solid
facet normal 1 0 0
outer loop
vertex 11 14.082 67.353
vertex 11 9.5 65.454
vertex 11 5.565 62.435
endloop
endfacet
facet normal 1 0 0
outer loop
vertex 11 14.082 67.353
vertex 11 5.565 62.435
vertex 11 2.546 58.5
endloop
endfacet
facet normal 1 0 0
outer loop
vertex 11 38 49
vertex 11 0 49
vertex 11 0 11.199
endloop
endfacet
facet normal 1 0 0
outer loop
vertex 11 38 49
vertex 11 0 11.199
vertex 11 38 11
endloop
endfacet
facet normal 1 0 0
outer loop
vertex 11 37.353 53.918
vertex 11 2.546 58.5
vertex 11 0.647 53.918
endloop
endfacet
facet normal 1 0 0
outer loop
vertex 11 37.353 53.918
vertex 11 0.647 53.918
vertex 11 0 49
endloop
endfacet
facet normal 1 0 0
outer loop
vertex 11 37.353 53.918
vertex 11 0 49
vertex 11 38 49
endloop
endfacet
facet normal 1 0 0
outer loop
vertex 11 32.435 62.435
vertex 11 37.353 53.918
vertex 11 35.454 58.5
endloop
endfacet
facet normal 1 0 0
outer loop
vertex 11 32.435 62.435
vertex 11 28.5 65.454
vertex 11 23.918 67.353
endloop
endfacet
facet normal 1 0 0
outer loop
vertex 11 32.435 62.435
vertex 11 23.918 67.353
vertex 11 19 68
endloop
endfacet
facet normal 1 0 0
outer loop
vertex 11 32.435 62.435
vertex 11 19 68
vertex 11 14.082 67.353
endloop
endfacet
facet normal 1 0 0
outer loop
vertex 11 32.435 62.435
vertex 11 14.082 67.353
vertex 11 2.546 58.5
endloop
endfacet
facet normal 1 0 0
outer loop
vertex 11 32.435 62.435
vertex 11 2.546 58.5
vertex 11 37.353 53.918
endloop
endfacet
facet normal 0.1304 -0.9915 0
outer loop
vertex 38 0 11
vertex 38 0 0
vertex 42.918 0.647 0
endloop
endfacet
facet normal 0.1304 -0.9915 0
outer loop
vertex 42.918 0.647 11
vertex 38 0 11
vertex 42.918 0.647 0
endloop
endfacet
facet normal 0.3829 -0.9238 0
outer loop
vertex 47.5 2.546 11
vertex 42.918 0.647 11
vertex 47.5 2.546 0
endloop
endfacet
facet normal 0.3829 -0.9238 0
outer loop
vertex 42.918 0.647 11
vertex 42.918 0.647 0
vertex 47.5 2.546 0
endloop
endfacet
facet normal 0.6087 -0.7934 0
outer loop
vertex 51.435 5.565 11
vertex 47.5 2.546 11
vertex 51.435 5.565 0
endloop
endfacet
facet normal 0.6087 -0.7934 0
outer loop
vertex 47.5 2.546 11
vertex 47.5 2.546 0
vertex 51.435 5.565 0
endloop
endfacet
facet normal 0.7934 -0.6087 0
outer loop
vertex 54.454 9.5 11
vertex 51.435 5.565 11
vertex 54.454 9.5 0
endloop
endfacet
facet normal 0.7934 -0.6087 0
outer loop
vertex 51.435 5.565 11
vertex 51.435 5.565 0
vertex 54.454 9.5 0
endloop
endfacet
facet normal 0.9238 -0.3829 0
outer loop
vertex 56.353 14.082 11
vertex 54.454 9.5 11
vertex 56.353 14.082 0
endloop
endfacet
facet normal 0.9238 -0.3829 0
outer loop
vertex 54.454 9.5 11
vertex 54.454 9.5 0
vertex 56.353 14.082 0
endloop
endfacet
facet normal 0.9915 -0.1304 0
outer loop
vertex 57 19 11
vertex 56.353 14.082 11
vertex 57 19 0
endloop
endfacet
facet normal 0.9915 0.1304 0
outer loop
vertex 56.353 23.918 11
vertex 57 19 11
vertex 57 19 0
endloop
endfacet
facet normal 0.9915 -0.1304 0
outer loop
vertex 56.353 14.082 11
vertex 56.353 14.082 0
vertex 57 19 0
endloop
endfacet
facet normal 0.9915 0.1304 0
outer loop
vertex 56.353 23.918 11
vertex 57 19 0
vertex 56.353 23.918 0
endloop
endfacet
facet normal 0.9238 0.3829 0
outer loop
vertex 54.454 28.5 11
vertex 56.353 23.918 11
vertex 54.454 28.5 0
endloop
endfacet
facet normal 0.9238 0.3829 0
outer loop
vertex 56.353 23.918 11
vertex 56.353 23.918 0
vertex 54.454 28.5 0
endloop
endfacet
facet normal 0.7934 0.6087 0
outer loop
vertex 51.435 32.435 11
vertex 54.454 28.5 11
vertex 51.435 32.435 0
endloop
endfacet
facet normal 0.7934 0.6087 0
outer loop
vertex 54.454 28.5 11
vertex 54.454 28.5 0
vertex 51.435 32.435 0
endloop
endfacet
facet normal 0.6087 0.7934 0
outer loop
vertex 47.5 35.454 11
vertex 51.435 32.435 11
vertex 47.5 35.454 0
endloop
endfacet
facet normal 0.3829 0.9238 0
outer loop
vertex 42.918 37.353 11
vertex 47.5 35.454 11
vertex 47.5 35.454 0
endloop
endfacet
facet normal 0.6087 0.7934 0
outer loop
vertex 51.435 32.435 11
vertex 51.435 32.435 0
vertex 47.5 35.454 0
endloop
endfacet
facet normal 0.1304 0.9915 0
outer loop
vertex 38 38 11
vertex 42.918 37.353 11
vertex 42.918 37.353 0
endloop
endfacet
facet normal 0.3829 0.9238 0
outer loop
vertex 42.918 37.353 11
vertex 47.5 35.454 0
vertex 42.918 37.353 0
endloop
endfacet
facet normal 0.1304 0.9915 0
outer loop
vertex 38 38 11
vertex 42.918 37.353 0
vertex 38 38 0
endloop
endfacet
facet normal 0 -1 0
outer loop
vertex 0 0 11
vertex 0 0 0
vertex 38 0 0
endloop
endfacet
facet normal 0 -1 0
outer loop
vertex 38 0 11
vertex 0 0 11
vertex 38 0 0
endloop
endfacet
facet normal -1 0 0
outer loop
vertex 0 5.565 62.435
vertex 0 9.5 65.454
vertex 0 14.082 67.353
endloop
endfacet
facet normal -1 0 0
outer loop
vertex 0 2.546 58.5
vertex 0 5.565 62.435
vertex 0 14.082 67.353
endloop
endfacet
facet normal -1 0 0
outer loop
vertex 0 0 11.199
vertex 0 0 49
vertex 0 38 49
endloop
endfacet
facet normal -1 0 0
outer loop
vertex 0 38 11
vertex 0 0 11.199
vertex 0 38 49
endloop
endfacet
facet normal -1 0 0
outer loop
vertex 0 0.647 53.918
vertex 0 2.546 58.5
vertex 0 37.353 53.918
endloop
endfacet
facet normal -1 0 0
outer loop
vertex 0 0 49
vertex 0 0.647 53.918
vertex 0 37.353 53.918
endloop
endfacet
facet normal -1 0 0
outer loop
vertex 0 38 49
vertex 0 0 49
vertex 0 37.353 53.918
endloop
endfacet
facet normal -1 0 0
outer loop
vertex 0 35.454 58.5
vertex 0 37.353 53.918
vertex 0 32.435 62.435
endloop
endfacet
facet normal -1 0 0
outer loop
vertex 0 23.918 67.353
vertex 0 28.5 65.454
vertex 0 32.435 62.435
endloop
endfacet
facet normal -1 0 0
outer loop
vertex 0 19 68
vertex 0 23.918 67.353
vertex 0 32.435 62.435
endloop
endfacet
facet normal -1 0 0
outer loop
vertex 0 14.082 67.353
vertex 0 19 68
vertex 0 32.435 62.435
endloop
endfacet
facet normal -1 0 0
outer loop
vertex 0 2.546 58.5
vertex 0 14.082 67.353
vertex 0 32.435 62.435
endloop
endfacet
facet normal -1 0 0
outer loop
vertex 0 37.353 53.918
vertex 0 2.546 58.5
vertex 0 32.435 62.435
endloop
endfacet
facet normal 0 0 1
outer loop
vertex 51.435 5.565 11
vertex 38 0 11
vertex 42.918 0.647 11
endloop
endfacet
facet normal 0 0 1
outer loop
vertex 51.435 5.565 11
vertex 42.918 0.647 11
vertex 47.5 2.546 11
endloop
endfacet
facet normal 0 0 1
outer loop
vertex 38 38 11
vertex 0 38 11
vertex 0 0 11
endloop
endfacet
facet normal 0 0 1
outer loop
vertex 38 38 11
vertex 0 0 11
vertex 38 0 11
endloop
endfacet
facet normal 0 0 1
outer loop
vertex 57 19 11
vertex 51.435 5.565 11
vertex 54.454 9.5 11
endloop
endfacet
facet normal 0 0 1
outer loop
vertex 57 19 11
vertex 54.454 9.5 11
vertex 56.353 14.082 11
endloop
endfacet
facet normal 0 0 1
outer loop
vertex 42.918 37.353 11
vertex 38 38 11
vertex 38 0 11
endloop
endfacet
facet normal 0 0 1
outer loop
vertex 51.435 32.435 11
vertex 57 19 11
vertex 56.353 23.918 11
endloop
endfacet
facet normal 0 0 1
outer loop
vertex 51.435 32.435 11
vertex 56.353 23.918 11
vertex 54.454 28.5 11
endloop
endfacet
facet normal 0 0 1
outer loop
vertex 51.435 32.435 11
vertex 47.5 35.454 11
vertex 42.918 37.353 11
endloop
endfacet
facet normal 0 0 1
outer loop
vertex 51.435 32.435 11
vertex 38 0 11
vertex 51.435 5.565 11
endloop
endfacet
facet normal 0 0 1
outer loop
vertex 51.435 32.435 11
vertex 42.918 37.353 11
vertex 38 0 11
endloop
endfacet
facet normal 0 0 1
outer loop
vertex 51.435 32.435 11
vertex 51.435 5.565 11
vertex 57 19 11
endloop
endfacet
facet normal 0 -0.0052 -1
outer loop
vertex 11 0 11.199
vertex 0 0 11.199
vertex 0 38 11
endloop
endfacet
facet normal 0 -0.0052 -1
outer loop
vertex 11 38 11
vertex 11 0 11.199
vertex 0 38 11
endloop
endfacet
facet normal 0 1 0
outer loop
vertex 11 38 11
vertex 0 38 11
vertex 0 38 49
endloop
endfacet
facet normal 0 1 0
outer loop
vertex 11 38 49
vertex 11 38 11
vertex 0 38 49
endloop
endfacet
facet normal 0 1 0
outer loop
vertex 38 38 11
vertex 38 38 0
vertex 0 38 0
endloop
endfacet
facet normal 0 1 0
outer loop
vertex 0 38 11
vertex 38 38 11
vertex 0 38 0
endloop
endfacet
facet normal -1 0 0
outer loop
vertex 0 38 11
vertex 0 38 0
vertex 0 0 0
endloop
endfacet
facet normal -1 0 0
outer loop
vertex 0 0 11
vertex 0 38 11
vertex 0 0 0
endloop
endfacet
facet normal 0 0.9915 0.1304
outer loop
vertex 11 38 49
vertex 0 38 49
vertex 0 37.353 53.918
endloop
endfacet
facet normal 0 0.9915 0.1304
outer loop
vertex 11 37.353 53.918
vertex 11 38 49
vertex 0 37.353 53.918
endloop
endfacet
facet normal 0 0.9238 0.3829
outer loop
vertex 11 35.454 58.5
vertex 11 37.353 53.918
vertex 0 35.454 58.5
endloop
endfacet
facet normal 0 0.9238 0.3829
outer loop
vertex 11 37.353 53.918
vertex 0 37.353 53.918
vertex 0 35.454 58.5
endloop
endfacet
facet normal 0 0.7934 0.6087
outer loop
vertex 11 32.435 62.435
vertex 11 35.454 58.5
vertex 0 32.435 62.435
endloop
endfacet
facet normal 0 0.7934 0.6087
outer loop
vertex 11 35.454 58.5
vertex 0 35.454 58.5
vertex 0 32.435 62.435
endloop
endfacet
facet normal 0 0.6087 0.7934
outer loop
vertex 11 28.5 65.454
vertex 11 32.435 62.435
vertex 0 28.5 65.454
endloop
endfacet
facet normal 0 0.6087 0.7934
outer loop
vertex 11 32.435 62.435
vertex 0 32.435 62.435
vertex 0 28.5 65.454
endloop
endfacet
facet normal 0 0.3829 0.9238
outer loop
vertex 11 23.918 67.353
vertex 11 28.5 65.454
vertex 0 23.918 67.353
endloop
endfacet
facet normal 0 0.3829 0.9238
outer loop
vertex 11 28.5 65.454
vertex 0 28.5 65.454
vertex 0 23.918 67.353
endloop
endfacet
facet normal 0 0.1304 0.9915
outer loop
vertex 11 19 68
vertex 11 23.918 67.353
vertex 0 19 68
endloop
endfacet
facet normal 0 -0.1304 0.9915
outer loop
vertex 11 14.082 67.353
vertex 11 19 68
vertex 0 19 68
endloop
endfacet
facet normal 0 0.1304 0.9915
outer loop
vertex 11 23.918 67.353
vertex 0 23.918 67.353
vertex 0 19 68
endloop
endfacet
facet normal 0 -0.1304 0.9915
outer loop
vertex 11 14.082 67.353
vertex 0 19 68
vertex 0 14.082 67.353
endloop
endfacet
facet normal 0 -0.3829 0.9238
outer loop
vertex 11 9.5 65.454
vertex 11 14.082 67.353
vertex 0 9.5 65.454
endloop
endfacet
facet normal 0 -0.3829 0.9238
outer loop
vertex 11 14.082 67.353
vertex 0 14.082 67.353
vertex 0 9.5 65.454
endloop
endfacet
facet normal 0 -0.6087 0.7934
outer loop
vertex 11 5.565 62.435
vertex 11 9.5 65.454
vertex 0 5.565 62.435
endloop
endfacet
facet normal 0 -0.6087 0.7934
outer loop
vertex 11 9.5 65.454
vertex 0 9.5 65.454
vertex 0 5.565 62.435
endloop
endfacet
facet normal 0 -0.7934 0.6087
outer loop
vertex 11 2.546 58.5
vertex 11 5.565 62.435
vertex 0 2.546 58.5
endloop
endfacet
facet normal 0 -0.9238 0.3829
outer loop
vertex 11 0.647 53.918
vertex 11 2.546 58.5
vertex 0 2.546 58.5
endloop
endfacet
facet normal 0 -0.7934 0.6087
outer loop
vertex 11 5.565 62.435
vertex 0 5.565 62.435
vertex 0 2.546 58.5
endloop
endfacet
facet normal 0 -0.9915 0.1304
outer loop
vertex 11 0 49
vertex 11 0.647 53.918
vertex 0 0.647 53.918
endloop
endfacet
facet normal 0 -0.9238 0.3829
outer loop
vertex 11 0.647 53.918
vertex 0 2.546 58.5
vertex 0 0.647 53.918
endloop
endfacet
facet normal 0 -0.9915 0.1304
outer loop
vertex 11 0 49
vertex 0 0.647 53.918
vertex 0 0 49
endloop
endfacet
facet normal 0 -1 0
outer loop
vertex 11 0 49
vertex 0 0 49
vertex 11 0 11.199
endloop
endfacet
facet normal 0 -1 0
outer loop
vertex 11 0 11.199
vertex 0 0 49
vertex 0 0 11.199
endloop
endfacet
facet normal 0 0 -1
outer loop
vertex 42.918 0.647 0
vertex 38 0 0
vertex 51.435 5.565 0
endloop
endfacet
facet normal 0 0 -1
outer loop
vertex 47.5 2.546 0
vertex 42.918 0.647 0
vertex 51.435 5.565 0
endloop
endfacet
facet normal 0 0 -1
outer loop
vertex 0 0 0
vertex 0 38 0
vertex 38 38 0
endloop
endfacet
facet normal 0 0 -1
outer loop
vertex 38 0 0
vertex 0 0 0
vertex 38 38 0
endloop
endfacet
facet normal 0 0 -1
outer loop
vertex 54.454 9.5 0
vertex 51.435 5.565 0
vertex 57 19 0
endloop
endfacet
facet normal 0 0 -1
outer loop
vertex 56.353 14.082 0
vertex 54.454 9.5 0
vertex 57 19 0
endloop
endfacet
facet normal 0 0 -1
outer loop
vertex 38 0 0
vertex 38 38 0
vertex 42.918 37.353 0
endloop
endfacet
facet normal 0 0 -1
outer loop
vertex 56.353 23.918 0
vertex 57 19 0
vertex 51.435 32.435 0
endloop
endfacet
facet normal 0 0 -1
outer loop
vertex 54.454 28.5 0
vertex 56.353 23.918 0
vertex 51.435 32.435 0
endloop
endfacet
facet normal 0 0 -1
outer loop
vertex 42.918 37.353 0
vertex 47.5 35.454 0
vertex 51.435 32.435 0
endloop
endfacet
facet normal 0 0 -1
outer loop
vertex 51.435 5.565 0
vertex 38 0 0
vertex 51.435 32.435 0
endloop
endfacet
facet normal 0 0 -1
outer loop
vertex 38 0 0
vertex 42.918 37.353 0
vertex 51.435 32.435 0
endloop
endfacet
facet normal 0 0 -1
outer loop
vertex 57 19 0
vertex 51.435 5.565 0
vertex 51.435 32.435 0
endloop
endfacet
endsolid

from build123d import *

# Parameters (mm, degrees)
F1_DEPTH = 11
F3_DEPTH = 11


with BuildPart() as f1:
    # F0 (on Top) → F1 (new body)
    with BuildSketch(Plane.XY):
        with BuildLine():
            Line((0, 38), (0, 0))
            Line((0, 0), (38, 0))
            ThreePointArc((38, 0), (57, 19), (38, 38))
            Line((38, 38), (0, 38))
        make_face()
    extrude(amount=F1_DEPTH)


with BuildPart() as f3:
    # F2 (on Right) → F3 (new body)
    with BuildSketch(Plane.YZ):
        with BuildLine():
            Line((0, 49), (0, 11.198676))
            Line((0, 11.198676), (38, 11))
            Line((38, 11), (38, 49))
            ThreePointArc((38, 49), (19, 68), (0, 49))
        make_face()
    extrude(amount=F3_DEPTH)


solid = Compound([f1.part, f3.part])
